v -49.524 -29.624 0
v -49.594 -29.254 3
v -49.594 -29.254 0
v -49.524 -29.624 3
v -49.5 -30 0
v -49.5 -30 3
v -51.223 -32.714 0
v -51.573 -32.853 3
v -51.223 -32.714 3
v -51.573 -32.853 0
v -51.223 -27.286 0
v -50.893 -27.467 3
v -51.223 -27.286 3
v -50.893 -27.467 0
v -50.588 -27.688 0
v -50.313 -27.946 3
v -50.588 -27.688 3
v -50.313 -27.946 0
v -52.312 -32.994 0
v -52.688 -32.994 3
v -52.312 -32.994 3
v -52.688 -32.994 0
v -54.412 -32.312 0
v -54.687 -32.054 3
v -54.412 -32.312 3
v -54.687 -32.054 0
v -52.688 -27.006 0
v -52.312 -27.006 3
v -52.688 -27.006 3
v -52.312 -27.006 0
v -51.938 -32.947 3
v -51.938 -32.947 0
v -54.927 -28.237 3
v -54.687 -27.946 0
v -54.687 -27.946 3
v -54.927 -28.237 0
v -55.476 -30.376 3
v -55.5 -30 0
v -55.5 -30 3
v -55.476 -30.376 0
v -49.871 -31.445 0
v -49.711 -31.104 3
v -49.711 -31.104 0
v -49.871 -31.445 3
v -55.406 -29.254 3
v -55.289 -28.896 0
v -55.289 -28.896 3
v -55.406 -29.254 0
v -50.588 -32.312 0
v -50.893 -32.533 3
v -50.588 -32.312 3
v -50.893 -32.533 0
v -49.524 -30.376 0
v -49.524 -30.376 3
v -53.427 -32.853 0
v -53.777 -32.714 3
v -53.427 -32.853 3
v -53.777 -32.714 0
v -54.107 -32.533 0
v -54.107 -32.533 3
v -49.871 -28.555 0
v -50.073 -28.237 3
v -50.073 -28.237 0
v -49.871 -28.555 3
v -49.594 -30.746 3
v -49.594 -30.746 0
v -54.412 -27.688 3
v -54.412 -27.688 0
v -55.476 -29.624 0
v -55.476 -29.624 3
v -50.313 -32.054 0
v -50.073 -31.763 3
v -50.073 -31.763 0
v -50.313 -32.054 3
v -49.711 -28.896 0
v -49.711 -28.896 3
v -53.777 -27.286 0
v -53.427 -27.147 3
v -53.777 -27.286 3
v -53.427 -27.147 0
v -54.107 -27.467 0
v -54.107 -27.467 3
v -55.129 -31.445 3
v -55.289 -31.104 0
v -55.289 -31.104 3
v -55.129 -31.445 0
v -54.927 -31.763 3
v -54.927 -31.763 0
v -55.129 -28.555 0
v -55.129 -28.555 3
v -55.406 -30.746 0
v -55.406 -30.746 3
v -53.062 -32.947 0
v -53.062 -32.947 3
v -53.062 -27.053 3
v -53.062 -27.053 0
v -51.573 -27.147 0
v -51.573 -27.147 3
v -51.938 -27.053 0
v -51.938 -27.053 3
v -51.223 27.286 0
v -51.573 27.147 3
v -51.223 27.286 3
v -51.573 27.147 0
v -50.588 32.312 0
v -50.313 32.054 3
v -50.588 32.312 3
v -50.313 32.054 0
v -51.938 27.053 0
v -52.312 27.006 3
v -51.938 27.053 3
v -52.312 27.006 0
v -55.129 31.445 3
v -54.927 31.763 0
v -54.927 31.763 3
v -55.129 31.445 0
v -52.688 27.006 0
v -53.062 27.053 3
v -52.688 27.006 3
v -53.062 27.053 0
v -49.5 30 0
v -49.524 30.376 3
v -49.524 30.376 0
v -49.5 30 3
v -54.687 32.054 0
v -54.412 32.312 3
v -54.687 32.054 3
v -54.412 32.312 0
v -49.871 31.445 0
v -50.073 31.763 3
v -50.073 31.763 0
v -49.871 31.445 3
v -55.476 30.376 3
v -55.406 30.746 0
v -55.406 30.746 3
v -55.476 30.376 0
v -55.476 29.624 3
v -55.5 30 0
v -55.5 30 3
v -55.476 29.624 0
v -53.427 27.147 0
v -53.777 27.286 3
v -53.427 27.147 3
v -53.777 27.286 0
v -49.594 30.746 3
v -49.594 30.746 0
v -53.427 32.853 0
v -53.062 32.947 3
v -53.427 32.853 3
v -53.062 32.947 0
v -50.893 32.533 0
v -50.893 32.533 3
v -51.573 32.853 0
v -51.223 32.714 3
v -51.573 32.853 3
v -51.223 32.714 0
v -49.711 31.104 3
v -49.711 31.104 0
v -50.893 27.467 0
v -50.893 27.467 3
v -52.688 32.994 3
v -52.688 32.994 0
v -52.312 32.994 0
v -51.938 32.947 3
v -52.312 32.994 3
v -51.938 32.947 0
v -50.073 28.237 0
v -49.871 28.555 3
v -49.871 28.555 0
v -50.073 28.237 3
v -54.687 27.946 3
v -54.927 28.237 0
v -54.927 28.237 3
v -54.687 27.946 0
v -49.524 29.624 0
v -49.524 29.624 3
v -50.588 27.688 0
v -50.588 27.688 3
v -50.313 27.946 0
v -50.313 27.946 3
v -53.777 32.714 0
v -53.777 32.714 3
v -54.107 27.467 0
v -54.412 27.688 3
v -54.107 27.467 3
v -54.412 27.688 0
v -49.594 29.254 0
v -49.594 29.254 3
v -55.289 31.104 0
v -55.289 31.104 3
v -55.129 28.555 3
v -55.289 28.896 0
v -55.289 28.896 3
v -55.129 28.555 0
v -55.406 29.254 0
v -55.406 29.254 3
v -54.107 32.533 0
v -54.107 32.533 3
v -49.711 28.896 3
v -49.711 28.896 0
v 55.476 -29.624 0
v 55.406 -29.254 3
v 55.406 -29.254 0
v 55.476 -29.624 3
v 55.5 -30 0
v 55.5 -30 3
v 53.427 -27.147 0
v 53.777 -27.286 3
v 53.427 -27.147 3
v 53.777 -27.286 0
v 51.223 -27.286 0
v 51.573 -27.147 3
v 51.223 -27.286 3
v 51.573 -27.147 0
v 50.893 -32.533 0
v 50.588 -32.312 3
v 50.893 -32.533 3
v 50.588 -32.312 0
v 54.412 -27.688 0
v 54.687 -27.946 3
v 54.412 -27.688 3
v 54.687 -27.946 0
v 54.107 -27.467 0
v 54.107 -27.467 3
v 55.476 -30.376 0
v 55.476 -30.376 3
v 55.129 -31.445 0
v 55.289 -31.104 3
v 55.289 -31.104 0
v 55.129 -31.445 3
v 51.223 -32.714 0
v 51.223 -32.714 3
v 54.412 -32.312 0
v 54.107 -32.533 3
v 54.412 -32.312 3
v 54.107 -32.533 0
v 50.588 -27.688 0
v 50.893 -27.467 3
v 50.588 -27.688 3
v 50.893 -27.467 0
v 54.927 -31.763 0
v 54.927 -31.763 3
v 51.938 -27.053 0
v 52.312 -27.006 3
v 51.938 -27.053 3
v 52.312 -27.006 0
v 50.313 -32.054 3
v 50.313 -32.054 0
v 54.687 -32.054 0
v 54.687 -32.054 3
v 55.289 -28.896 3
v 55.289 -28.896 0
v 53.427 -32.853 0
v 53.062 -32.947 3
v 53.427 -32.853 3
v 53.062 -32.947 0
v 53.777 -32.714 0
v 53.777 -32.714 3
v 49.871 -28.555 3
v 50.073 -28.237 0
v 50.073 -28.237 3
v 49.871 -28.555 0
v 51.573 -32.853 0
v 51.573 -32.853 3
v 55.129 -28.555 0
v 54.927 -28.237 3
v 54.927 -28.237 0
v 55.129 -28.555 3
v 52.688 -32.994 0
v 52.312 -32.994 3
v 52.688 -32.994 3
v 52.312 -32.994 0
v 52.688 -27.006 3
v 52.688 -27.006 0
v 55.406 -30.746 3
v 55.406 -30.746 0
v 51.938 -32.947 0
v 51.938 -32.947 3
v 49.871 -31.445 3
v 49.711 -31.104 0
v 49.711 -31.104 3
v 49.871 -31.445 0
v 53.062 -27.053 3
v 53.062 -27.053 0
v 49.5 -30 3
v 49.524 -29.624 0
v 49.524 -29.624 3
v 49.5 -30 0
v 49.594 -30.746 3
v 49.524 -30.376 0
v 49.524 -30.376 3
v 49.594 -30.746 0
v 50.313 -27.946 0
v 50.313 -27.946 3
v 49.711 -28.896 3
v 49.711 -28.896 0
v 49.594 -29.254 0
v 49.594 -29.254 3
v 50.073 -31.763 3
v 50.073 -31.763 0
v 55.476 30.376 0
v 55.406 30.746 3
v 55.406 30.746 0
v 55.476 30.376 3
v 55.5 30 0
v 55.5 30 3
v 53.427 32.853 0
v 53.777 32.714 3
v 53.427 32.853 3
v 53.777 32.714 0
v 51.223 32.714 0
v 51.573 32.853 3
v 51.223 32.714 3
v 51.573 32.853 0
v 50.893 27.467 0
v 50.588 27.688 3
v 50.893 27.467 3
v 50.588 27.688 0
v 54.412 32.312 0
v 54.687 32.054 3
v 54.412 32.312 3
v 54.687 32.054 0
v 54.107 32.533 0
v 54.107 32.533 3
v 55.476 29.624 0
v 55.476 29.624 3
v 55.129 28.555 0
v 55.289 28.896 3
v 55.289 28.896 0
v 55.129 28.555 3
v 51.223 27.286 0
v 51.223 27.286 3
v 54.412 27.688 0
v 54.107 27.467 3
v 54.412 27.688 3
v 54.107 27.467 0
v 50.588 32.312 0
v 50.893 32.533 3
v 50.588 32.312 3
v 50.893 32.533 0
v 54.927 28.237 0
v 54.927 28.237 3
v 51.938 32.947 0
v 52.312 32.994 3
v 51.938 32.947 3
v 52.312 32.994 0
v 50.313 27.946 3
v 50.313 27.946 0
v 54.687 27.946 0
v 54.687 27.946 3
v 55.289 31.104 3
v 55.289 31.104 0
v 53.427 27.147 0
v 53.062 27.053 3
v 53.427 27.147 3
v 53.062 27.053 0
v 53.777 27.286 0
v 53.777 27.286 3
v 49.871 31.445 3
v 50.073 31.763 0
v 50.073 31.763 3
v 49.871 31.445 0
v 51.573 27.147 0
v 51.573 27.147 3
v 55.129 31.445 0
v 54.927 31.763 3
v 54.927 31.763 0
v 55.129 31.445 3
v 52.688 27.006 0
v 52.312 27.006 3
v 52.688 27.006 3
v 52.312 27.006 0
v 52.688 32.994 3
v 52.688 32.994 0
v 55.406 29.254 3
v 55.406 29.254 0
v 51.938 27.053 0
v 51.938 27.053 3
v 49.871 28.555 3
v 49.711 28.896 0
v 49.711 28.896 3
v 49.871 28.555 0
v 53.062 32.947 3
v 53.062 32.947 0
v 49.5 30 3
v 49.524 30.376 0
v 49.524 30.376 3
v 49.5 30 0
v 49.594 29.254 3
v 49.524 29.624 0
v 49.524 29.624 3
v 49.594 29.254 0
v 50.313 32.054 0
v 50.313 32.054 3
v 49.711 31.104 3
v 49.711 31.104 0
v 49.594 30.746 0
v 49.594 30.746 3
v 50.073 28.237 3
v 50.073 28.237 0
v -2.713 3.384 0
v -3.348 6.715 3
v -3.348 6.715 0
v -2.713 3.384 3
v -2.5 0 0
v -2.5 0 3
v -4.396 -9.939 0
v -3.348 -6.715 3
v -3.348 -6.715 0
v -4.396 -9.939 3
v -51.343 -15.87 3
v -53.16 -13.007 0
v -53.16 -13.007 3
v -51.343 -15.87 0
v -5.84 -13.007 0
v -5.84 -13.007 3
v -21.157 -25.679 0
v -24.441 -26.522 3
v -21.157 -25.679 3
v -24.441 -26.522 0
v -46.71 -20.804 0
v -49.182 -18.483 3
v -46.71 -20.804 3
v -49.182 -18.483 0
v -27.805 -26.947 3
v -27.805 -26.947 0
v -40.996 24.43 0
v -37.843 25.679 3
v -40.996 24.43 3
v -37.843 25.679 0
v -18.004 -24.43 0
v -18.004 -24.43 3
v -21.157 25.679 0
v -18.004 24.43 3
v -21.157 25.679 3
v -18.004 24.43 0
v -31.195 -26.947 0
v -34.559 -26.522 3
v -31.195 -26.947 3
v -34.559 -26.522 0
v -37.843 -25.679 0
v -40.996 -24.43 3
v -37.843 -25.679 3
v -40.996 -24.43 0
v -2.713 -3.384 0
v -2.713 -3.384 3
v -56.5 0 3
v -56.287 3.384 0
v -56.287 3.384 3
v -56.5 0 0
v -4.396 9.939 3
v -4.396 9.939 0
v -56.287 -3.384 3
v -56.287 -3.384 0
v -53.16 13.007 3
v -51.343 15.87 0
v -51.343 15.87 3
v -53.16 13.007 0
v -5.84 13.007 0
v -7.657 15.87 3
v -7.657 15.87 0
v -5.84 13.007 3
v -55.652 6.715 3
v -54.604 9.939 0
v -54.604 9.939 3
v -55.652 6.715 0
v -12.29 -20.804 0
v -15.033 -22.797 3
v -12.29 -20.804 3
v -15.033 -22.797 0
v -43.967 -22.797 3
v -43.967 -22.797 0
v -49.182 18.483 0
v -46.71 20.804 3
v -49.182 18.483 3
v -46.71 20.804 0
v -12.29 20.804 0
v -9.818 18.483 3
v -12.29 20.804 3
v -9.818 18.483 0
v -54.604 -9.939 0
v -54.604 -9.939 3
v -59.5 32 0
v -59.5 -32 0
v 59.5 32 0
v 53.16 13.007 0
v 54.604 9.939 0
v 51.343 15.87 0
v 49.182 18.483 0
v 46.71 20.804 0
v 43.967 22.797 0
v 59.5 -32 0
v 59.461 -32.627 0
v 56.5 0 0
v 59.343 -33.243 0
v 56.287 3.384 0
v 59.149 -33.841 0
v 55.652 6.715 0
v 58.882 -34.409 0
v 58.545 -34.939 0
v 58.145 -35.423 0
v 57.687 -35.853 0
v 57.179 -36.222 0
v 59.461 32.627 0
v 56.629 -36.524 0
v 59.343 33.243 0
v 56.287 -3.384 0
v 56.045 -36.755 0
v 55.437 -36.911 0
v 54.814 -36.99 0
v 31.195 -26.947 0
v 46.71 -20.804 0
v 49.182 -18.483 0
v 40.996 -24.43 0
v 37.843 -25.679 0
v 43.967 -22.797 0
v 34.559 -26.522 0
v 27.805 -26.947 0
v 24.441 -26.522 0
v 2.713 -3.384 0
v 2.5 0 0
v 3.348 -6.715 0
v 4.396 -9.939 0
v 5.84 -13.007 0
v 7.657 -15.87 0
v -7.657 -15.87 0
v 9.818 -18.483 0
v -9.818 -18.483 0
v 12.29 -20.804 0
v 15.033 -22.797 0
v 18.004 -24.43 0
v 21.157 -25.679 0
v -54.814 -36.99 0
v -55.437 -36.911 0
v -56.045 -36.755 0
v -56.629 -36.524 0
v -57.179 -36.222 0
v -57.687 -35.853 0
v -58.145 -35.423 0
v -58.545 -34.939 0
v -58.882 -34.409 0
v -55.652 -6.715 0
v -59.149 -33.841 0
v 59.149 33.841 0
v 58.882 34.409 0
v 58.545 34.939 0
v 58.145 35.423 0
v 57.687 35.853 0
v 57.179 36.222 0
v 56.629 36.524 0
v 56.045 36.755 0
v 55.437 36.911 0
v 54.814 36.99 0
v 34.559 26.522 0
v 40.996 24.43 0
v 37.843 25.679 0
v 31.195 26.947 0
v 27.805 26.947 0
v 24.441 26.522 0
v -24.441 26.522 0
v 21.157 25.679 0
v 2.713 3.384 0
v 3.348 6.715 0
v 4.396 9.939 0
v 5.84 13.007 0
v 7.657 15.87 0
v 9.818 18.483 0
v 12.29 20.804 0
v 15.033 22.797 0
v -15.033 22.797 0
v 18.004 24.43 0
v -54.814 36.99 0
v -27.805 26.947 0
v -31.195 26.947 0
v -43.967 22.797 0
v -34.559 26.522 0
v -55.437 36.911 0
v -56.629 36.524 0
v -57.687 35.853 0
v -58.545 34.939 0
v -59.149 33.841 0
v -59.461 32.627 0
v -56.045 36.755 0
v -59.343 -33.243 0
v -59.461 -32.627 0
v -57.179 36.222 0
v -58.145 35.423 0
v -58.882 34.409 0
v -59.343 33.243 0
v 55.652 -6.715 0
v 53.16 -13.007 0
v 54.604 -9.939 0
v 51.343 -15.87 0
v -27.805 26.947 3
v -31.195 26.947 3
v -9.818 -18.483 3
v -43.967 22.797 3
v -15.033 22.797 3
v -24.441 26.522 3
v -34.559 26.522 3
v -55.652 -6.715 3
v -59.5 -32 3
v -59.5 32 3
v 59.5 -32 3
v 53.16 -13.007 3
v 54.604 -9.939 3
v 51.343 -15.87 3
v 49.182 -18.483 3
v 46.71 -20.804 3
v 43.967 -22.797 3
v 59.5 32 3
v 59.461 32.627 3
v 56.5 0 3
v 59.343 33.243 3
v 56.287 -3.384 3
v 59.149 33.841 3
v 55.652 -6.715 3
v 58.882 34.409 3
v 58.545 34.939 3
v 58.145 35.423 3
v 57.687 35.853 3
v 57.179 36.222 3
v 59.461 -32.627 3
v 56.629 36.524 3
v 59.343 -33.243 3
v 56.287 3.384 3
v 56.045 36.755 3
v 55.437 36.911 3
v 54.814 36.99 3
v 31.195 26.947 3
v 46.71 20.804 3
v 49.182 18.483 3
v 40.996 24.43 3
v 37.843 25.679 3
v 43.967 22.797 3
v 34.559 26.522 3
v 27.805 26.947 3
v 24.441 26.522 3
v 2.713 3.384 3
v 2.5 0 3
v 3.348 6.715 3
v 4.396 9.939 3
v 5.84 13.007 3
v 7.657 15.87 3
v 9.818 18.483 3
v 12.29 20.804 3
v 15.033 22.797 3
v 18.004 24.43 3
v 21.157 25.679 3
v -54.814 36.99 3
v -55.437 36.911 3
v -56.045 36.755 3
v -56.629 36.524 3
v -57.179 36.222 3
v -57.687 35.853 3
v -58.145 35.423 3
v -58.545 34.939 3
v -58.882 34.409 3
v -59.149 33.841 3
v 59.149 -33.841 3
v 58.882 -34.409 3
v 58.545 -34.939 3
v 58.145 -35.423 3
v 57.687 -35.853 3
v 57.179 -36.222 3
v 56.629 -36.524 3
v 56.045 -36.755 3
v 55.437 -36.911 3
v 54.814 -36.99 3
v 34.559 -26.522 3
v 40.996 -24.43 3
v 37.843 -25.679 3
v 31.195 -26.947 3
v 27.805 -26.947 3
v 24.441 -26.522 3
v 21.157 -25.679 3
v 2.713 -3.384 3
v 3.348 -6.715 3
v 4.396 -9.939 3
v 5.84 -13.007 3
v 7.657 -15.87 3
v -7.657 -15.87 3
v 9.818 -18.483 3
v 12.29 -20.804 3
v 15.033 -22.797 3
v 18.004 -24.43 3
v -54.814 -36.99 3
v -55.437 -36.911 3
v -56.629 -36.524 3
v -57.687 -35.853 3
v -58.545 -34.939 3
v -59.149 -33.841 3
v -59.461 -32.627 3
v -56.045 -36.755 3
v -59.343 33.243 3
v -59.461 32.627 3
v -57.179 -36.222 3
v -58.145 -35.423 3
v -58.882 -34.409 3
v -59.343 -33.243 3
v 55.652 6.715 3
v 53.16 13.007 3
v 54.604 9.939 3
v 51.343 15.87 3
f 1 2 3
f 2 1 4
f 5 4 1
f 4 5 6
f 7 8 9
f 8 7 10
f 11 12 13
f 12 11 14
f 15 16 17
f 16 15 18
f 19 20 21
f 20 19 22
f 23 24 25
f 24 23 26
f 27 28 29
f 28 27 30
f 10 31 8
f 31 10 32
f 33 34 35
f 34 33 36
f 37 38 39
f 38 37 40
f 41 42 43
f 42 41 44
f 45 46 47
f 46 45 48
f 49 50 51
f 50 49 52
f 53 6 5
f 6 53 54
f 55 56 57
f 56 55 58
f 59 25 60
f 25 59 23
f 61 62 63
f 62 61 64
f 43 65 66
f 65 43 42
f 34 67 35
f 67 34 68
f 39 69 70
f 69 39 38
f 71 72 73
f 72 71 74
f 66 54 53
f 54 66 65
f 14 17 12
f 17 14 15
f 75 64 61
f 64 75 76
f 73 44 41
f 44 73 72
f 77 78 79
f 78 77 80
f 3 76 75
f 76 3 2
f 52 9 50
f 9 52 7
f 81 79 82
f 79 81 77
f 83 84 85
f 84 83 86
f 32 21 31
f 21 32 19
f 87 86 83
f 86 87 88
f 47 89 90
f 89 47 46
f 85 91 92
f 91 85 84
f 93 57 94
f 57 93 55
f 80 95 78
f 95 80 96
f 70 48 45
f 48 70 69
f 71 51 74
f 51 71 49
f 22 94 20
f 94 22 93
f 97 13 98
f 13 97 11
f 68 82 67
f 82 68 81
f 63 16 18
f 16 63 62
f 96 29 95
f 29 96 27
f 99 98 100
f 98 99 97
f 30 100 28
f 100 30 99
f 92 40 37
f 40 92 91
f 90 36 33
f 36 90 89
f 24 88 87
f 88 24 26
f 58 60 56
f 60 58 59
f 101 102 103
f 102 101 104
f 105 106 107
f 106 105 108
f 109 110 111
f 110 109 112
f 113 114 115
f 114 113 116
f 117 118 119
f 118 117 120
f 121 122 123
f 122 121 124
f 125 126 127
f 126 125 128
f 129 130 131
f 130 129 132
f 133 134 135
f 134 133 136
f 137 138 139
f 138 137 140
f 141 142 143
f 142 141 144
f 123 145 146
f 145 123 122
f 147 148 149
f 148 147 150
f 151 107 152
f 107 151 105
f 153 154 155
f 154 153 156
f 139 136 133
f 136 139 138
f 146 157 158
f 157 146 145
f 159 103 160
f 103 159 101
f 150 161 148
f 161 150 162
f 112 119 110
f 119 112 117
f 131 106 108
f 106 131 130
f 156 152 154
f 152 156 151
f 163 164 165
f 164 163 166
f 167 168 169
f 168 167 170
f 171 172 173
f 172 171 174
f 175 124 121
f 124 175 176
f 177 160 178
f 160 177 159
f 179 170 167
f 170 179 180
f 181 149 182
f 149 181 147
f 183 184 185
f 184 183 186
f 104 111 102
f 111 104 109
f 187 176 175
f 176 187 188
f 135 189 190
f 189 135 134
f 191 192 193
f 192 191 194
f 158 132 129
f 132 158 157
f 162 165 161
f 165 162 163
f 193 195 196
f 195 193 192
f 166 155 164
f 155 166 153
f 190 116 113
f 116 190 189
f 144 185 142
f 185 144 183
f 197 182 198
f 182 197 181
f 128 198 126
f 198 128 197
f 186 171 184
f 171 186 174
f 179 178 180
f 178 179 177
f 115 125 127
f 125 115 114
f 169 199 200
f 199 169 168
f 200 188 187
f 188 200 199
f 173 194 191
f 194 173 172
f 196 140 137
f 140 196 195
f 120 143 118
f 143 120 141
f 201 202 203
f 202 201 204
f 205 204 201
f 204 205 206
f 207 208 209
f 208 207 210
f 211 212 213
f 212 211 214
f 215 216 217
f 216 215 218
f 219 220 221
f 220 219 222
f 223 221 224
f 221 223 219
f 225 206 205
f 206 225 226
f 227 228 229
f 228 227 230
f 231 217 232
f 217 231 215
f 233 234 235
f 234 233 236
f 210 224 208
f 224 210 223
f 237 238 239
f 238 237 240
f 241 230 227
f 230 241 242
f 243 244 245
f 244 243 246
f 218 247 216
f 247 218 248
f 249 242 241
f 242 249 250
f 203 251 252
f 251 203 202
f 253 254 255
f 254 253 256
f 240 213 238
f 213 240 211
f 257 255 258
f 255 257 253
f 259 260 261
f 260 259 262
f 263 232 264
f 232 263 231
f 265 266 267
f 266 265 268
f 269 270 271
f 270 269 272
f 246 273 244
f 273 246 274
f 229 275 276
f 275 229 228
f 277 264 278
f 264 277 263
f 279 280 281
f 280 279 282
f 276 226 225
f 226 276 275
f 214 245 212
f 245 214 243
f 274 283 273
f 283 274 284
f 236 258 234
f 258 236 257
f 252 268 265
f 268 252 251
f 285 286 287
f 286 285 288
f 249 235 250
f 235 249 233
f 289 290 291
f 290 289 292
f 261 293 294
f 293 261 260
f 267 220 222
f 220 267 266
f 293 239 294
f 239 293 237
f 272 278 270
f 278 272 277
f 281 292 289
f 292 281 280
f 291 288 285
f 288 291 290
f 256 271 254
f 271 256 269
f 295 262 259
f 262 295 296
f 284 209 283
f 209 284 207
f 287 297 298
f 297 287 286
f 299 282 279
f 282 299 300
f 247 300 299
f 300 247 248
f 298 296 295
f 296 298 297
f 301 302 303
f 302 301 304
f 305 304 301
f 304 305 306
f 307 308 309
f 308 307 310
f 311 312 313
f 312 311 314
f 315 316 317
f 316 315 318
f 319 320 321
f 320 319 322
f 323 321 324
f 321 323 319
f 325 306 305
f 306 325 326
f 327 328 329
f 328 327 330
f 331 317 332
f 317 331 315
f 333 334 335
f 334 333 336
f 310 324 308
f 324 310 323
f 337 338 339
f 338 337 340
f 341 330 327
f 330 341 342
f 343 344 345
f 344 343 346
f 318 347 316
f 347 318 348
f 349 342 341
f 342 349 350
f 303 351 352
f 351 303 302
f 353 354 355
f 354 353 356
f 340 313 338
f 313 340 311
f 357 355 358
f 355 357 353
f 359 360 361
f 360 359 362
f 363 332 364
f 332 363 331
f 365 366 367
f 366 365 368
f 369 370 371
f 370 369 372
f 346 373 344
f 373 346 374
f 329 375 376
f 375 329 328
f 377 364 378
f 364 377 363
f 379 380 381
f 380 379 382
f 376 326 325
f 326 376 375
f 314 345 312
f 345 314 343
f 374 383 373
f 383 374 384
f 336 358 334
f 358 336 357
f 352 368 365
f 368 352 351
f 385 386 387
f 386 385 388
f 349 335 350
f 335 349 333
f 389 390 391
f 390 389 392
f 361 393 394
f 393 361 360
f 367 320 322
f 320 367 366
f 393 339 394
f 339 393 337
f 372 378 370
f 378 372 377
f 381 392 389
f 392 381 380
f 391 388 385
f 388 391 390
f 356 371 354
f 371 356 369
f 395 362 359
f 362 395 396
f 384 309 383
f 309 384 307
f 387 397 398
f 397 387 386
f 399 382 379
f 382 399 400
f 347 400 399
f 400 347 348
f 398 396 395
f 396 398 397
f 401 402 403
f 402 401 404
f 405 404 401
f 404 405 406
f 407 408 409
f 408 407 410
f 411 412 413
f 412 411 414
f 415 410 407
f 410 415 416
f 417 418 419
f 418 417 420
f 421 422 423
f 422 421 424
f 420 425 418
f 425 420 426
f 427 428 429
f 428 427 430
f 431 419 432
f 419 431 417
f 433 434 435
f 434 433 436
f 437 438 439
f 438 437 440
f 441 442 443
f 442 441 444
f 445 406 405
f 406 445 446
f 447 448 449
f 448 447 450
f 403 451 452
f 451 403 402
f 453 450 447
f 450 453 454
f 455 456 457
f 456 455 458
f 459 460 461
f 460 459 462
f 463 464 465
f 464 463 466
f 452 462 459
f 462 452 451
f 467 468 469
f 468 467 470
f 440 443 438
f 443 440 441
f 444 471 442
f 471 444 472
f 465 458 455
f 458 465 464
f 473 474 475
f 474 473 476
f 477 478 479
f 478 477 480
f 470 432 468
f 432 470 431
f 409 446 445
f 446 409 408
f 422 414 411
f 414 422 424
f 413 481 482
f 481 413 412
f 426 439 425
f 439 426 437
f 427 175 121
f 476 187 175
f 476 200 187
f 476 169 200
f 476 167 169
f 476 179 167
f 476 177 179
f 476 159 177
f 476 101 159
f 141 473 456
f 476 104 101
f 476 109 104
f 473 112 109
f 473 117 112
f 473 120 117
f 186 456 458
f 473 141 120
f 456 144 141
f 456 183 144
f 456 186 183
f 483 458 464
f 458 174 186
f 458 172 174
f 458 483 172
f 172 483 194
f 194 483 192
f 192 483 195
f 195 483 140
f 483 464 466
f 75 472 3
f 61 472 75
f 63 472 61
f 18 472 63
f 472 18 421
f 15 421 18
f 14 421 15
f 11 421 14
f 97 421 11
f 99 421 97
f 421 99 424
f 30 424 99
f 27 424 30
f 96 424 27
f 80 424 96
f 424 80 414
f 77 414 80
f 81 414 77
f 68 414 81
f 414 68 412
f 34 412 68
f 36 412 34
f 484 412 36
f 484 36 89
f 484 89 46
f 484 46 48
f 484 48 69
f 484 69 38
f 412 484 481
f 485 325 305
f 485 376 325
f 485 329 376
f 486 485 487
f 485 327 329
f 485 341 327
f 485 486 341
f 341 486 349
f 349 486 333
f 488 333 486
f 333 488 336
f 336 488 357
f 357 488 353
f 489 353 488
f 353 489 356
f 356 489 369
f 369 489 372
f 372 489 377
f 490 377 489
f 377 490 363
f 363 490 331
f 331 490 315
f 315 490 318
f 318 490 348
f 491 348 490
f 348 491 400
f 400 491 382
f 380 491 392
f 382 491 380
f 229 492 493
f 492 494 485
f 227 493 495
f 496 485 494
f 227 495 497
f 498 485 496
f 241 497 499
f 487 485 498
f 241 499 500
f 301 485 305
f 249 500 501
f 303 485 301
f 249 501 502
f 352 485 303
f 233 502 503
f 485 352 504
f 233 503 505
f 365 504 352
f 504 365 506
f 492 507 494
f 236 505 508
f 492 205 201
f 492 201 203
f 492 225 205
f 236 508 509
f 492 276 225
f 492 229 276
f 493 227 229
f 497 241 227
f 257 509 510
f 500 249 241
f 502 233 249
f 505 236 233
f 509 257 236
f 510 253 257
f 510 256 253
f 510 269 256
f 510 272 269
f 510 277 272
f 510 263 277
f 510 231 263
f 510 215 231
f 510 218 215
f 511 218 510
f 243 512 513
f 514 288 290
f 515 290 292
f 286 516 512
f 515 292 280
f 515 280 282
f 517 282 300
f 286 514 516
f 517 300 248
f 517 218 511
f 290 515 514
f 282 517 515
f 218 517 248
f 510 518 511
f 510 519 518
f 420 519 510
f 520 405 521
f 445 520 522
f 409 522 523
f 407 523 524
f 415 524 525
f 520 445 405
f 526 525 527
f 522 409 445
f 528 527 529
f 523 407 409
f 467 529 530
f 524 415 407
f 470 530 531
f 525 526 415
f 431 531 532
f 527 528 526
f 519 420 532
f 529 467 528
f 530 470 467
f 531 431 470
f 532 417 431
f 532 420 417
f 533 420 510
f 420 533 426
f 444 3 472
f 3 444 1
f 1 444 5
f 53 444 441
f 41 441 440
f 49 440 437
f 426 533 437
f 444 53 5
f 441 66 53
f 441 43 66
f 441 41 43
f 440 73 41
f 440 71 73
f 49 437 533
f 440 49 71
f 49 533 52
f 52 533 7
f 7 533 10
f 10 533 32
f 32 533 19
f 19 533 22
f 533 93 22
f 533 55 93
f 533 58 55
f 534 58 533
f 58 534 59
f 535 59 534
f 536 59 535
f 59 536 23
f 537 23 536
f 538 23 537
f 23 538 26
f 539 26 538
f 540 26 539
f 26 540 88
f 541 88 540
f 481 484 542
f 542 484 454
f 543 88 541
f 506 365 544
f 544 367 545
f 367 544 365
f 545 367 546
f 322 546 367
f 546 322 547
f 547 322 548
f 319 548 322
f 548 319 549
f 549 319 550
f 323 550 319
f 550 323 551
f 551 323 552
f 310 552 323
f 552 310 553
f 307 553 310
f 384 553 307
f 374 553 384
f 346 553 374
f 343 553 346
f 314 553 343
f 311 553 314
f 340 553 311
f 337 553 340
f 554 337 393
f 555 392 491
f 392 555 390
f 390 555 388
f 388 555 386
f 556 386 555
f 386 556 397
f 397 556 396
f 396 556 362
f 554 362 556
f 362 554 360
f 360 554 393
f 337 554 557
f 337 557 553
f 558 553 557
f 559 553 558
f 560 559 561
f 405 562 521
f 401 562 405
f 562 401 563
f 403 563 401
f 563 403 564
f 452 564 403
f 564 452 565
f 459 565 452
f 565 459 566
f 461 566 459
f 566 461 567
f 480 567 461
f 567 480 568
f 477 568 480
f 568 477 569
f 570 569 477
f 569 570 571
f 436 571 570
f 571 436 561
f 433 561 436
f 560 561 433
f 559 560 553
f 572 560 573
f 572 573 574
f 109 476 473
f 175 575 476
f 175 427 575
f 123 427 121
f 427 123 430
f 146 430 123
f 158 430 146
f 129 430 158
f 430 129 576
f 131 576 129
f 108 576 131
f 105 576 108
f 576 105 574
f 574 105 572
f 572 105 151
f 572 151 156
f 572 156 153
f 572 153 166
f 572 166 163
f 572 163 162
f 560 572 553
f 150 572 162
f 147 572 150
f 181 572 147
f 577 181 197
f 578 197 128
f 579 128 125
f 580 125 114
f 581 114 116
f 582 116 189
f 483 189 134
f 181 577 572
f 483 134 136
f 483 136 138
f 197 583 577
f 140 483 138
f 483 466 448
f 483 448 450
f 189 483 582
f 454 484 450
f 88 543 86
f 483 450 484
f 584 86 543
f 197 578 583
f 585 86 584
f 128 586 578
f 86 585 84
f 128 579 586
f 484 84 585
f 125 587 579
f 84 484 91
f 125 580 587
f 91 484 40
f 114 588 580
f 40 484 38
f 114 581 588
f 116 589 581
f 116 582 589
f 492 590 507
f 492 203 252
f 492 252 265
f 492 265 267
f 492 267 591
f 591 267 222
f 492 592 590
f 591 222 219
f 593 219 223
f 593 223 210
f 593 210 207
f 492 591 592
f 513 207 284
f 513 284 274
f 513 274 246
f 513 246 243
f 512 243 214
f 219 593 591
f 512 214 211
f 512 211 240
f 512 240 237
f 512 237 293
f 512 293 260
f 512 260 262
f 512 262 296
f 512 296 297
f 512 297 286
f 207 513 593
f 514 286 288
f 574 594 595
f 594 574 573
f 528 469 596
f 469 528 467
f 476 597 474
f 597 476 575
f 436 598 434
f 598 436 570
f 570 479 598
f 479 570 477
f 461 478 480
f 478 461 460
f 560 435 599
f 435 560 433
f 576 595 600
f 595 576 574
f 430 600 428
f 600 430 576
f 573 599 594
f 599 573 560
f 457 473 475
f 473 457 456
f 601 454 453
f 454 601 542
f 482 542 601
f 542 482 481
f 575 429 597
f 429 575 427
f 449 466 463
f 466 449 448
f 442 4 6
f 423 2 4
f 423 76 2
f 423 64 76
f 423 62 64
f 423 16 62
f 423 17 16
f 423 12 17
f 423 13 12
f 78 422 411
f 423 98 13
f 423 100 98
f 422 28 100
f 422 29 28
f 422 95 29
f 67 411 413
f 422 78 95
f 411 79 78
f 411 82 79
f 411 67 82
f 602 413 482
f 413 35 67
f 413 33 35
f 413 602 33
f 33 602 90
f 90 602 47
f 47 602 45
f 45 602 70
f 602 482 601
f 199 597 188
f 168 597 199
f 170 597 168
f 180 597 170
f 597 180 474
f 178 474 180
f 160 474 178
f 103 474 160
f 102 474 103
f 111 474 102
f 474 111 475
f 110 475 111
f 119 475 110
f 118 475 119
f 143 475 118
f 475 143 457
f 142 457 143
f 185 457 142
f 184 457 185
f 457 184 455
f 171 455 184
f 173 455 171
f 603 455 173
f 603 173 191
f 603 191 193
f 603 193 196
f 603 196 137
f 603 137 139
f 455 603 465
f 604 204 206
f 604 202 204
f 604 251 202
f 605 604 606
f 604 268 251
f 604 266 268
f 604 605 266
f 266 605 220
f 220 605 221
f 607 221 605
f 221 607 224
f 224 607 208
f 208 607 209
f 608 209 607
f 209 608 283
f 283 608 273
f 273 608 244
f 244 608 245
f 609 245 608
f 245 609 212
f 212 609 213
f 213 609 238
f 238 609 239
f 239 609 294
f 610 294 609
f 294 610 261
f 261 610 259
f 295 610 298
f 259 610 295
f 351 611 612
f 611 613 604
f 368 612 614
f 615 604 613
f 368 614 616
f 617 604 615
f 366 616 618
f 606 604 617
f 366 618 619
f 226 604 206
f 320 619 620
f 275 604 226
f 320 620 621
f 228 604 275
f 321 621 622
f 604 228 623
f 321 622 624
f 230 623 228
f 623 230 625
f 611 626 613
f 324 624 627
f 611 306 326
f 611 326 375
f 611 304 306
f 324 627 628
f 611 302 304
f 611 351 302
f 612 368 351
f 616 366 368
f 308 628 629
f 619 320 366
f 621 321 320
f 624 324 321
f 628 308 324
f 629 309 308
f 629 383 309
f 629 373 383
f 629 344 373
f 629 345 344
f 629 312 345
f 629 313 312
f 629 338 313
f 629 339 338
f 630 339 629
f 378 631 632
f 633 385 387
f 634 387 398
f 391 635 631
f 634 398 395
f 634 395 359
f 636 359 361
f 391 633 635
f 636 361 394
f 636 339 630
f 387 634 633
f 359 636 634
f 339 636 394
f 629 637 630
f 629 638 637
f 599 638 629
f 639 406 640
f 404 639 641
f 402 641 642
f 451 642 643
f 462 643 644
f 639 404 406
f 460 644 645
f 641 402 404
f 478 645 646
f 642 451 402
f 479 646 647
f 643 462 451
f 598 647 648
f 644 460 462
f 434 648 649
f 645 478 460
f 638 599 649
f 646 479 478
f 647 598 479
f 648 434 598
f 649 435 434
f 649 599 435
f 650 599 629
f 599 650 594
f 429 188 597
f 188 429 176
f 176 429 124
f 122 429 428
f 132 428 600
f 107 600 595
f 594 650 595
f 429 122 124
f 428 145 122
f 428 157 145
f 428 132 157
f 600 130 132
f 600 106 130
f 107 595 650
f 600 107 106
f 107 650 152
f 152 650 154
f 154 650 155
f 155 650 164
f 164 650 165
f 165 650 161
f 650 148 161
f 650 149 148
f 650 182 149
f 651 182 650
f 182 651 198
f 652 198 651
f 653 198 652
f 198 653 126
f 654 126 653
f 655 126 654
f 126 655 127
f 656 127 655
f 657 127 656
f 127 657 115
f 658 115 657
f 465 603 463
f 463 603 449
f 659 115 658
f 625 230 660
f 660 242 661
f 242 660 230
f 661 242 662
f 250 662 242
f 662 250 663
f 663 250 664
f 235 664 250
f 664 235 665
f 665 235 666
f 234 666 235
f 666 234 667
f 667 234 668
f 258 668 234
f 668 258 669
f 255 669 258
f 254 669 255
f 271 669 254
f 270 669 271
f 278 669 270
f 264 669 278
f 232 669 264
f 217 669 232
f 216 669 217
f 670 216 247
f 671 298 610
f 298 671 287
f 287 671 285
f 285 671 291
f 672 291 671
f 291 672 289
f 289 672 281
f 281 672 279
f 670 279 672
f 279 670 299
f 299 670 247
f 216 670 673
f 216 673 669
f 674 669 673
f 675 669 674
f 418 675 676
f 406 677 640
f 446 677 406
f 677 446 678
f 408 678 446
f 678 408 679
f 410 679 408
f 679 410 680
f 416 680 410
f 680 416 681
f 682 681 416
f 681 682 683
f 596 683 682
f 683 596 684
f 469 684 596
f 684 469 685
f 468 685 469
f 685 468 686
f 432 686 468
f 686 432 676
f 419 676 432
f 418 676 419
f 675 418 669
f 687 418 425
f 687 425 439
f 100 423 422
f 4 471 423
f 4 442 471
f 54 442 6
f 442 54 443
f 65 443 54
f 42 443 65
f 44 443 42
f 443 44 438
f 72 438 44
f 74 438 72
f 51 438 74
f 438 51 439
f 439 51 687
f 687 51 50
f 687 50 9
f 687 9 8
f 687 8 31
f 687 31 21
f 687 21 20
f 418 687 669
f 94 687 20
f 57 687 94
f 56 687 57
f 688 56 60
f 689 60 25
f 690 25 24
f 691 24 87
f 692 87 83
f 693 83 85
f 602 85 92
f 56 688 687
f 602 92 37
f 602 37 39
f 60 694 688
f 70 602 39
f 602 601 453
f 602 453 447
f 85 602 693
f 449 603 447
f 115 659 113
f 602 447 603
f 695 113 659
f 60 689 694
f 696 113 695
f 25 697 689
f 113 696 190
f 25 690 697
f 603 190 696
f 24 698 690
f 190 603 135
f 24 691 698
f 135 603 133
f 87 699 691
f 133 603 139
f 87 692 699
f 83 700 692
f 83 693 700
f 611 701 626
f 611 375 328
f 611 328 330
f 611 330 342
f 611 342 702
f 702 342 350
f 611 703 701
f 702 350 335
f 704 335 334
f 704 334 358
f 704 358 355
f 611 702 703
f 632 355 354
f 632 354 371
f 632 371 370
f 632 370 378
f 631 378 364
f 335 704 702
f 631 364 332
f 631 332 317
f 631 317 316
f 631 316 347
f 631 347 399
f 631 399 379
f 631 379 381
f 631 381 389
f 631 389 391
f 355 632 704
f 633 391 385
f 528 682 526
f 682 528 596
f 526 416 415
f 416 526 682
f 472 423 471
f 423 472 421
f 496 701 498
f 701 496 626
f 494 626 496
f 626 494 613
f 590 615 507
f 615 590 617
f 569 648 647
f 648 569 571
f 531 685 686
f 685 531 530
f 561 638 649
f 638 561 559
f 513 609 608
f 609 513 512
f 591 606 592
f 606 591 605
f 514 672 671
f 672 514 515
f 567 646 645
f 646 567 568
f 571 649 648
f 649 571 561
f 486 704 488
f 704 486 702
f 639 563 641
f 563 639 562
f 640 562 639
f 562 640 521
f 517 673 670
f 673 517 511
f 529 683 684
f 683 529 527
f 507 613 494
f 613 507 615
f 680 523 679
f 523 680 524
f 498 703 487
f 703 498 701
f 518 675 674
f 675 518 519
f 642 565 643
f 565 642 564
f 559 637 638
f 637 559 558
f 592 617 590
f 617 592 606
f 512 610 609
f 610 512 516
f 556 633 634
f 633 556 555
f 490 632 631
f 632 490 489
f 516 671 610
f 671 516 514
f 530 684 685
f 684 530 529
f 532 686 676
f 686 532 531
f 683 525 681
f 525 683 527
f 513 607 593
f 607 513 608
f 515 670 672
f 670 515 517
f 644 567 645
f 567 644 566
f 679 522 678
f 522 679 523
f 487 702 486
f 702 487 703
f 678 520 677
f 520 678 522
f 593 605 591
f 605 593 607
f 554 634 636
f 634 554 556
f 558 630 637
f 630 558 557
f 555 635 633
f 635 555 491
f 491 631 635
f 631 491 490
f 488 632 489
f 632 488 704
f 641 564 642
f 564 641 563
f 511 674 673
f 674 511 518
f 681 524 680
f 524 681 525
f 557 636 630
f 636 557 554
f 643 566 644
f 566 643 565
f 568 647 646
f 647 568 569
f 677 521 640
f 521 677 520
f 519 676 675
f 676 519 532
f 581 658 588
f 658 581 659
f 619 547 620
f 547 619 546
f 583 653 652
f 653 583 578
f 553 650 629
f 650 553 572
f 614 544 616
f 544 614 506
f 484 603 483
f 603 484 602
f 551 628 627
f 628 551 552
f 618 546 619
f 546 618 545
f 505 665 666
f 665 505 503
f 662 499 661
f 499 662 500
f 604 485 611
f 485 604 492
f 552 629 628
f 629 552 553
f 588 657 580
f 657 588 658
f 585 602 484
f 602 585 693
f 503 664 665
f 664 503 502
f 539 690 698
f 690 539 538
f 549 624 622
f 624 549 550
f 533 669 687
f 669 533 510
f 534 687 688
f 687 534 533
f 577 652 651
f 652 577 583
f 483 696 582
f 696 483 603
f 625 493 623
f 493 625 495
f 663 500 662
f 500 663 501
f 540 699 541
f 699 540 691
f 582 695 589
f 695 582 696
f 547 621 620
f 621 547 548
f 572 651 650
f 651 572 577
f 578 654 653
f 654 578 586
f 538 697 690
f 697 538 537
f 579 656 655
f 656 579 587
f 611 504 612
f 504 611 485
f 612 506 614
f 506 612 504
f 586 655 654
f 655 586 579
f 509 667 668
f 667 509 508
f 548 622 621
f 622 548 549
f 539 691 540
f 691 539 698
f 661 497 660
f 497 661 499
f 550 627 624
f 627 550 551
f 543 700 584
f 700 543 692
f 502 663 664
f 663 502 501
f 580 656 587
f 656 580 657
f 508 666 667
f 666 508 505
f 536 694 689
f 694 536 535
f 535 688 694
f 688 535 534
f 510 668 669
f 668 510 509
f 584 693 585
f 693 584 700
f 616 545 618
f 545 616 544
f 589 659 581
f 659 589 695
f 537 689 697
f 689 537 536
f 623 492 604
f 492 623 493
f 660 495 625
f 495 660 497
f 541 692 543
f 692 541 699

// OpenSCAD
$fn = 50;


difference() {
	union() {
		hull() {
			translate(v = [-54.5000000000, 32.0000000000, 0]) {
				cylinder(h = 3, r = 5);
			}
			translate(v = [54.5000000000, 32.0000000000, 0]) {
				cylinder(h = 3, r = 5);
			}
			translate(v = [-54.5000000000, -32.0000000000, 0]) {
				cylinder(h = 3, r = 5);
			}
			translate(v = [54.5000000000, -32.0000000000, 0]) {
				cylinder(h = 3, r = 5);
			}
		}
	}
	union() {
		#translate(v = [-52.5000000000, -30.0000000000, -100.0000000000]) {
			cylinder(h = 200, r = 3.0000000000);
		}
		#translate(v = [-52.5000000000, 30.0000000000, -100.0000000000]) {
			cylinder(h = 200, r = 3.0000000000);
		}
		#translate(v = [52.5000000000, -30.0000000000, -100.0000000000]) {
			cylinder(h = 200, r = 3.0000000000);
		}
		#translate(v = [52.5000000000, 30.0000000000, -100.0000000000]) {
			cylinder(h = 200, r = 3.0000000000);
		}
		#translate(v = [-29.5000000000, 0, 0]) {
			cylinder(h = 3, r = 27.0000000000);
		}
		#translate(v = [29.5000000000, 0, 0]) {
			cylinder(h = 3, r = 27.0000000000);
		}
	}
}
